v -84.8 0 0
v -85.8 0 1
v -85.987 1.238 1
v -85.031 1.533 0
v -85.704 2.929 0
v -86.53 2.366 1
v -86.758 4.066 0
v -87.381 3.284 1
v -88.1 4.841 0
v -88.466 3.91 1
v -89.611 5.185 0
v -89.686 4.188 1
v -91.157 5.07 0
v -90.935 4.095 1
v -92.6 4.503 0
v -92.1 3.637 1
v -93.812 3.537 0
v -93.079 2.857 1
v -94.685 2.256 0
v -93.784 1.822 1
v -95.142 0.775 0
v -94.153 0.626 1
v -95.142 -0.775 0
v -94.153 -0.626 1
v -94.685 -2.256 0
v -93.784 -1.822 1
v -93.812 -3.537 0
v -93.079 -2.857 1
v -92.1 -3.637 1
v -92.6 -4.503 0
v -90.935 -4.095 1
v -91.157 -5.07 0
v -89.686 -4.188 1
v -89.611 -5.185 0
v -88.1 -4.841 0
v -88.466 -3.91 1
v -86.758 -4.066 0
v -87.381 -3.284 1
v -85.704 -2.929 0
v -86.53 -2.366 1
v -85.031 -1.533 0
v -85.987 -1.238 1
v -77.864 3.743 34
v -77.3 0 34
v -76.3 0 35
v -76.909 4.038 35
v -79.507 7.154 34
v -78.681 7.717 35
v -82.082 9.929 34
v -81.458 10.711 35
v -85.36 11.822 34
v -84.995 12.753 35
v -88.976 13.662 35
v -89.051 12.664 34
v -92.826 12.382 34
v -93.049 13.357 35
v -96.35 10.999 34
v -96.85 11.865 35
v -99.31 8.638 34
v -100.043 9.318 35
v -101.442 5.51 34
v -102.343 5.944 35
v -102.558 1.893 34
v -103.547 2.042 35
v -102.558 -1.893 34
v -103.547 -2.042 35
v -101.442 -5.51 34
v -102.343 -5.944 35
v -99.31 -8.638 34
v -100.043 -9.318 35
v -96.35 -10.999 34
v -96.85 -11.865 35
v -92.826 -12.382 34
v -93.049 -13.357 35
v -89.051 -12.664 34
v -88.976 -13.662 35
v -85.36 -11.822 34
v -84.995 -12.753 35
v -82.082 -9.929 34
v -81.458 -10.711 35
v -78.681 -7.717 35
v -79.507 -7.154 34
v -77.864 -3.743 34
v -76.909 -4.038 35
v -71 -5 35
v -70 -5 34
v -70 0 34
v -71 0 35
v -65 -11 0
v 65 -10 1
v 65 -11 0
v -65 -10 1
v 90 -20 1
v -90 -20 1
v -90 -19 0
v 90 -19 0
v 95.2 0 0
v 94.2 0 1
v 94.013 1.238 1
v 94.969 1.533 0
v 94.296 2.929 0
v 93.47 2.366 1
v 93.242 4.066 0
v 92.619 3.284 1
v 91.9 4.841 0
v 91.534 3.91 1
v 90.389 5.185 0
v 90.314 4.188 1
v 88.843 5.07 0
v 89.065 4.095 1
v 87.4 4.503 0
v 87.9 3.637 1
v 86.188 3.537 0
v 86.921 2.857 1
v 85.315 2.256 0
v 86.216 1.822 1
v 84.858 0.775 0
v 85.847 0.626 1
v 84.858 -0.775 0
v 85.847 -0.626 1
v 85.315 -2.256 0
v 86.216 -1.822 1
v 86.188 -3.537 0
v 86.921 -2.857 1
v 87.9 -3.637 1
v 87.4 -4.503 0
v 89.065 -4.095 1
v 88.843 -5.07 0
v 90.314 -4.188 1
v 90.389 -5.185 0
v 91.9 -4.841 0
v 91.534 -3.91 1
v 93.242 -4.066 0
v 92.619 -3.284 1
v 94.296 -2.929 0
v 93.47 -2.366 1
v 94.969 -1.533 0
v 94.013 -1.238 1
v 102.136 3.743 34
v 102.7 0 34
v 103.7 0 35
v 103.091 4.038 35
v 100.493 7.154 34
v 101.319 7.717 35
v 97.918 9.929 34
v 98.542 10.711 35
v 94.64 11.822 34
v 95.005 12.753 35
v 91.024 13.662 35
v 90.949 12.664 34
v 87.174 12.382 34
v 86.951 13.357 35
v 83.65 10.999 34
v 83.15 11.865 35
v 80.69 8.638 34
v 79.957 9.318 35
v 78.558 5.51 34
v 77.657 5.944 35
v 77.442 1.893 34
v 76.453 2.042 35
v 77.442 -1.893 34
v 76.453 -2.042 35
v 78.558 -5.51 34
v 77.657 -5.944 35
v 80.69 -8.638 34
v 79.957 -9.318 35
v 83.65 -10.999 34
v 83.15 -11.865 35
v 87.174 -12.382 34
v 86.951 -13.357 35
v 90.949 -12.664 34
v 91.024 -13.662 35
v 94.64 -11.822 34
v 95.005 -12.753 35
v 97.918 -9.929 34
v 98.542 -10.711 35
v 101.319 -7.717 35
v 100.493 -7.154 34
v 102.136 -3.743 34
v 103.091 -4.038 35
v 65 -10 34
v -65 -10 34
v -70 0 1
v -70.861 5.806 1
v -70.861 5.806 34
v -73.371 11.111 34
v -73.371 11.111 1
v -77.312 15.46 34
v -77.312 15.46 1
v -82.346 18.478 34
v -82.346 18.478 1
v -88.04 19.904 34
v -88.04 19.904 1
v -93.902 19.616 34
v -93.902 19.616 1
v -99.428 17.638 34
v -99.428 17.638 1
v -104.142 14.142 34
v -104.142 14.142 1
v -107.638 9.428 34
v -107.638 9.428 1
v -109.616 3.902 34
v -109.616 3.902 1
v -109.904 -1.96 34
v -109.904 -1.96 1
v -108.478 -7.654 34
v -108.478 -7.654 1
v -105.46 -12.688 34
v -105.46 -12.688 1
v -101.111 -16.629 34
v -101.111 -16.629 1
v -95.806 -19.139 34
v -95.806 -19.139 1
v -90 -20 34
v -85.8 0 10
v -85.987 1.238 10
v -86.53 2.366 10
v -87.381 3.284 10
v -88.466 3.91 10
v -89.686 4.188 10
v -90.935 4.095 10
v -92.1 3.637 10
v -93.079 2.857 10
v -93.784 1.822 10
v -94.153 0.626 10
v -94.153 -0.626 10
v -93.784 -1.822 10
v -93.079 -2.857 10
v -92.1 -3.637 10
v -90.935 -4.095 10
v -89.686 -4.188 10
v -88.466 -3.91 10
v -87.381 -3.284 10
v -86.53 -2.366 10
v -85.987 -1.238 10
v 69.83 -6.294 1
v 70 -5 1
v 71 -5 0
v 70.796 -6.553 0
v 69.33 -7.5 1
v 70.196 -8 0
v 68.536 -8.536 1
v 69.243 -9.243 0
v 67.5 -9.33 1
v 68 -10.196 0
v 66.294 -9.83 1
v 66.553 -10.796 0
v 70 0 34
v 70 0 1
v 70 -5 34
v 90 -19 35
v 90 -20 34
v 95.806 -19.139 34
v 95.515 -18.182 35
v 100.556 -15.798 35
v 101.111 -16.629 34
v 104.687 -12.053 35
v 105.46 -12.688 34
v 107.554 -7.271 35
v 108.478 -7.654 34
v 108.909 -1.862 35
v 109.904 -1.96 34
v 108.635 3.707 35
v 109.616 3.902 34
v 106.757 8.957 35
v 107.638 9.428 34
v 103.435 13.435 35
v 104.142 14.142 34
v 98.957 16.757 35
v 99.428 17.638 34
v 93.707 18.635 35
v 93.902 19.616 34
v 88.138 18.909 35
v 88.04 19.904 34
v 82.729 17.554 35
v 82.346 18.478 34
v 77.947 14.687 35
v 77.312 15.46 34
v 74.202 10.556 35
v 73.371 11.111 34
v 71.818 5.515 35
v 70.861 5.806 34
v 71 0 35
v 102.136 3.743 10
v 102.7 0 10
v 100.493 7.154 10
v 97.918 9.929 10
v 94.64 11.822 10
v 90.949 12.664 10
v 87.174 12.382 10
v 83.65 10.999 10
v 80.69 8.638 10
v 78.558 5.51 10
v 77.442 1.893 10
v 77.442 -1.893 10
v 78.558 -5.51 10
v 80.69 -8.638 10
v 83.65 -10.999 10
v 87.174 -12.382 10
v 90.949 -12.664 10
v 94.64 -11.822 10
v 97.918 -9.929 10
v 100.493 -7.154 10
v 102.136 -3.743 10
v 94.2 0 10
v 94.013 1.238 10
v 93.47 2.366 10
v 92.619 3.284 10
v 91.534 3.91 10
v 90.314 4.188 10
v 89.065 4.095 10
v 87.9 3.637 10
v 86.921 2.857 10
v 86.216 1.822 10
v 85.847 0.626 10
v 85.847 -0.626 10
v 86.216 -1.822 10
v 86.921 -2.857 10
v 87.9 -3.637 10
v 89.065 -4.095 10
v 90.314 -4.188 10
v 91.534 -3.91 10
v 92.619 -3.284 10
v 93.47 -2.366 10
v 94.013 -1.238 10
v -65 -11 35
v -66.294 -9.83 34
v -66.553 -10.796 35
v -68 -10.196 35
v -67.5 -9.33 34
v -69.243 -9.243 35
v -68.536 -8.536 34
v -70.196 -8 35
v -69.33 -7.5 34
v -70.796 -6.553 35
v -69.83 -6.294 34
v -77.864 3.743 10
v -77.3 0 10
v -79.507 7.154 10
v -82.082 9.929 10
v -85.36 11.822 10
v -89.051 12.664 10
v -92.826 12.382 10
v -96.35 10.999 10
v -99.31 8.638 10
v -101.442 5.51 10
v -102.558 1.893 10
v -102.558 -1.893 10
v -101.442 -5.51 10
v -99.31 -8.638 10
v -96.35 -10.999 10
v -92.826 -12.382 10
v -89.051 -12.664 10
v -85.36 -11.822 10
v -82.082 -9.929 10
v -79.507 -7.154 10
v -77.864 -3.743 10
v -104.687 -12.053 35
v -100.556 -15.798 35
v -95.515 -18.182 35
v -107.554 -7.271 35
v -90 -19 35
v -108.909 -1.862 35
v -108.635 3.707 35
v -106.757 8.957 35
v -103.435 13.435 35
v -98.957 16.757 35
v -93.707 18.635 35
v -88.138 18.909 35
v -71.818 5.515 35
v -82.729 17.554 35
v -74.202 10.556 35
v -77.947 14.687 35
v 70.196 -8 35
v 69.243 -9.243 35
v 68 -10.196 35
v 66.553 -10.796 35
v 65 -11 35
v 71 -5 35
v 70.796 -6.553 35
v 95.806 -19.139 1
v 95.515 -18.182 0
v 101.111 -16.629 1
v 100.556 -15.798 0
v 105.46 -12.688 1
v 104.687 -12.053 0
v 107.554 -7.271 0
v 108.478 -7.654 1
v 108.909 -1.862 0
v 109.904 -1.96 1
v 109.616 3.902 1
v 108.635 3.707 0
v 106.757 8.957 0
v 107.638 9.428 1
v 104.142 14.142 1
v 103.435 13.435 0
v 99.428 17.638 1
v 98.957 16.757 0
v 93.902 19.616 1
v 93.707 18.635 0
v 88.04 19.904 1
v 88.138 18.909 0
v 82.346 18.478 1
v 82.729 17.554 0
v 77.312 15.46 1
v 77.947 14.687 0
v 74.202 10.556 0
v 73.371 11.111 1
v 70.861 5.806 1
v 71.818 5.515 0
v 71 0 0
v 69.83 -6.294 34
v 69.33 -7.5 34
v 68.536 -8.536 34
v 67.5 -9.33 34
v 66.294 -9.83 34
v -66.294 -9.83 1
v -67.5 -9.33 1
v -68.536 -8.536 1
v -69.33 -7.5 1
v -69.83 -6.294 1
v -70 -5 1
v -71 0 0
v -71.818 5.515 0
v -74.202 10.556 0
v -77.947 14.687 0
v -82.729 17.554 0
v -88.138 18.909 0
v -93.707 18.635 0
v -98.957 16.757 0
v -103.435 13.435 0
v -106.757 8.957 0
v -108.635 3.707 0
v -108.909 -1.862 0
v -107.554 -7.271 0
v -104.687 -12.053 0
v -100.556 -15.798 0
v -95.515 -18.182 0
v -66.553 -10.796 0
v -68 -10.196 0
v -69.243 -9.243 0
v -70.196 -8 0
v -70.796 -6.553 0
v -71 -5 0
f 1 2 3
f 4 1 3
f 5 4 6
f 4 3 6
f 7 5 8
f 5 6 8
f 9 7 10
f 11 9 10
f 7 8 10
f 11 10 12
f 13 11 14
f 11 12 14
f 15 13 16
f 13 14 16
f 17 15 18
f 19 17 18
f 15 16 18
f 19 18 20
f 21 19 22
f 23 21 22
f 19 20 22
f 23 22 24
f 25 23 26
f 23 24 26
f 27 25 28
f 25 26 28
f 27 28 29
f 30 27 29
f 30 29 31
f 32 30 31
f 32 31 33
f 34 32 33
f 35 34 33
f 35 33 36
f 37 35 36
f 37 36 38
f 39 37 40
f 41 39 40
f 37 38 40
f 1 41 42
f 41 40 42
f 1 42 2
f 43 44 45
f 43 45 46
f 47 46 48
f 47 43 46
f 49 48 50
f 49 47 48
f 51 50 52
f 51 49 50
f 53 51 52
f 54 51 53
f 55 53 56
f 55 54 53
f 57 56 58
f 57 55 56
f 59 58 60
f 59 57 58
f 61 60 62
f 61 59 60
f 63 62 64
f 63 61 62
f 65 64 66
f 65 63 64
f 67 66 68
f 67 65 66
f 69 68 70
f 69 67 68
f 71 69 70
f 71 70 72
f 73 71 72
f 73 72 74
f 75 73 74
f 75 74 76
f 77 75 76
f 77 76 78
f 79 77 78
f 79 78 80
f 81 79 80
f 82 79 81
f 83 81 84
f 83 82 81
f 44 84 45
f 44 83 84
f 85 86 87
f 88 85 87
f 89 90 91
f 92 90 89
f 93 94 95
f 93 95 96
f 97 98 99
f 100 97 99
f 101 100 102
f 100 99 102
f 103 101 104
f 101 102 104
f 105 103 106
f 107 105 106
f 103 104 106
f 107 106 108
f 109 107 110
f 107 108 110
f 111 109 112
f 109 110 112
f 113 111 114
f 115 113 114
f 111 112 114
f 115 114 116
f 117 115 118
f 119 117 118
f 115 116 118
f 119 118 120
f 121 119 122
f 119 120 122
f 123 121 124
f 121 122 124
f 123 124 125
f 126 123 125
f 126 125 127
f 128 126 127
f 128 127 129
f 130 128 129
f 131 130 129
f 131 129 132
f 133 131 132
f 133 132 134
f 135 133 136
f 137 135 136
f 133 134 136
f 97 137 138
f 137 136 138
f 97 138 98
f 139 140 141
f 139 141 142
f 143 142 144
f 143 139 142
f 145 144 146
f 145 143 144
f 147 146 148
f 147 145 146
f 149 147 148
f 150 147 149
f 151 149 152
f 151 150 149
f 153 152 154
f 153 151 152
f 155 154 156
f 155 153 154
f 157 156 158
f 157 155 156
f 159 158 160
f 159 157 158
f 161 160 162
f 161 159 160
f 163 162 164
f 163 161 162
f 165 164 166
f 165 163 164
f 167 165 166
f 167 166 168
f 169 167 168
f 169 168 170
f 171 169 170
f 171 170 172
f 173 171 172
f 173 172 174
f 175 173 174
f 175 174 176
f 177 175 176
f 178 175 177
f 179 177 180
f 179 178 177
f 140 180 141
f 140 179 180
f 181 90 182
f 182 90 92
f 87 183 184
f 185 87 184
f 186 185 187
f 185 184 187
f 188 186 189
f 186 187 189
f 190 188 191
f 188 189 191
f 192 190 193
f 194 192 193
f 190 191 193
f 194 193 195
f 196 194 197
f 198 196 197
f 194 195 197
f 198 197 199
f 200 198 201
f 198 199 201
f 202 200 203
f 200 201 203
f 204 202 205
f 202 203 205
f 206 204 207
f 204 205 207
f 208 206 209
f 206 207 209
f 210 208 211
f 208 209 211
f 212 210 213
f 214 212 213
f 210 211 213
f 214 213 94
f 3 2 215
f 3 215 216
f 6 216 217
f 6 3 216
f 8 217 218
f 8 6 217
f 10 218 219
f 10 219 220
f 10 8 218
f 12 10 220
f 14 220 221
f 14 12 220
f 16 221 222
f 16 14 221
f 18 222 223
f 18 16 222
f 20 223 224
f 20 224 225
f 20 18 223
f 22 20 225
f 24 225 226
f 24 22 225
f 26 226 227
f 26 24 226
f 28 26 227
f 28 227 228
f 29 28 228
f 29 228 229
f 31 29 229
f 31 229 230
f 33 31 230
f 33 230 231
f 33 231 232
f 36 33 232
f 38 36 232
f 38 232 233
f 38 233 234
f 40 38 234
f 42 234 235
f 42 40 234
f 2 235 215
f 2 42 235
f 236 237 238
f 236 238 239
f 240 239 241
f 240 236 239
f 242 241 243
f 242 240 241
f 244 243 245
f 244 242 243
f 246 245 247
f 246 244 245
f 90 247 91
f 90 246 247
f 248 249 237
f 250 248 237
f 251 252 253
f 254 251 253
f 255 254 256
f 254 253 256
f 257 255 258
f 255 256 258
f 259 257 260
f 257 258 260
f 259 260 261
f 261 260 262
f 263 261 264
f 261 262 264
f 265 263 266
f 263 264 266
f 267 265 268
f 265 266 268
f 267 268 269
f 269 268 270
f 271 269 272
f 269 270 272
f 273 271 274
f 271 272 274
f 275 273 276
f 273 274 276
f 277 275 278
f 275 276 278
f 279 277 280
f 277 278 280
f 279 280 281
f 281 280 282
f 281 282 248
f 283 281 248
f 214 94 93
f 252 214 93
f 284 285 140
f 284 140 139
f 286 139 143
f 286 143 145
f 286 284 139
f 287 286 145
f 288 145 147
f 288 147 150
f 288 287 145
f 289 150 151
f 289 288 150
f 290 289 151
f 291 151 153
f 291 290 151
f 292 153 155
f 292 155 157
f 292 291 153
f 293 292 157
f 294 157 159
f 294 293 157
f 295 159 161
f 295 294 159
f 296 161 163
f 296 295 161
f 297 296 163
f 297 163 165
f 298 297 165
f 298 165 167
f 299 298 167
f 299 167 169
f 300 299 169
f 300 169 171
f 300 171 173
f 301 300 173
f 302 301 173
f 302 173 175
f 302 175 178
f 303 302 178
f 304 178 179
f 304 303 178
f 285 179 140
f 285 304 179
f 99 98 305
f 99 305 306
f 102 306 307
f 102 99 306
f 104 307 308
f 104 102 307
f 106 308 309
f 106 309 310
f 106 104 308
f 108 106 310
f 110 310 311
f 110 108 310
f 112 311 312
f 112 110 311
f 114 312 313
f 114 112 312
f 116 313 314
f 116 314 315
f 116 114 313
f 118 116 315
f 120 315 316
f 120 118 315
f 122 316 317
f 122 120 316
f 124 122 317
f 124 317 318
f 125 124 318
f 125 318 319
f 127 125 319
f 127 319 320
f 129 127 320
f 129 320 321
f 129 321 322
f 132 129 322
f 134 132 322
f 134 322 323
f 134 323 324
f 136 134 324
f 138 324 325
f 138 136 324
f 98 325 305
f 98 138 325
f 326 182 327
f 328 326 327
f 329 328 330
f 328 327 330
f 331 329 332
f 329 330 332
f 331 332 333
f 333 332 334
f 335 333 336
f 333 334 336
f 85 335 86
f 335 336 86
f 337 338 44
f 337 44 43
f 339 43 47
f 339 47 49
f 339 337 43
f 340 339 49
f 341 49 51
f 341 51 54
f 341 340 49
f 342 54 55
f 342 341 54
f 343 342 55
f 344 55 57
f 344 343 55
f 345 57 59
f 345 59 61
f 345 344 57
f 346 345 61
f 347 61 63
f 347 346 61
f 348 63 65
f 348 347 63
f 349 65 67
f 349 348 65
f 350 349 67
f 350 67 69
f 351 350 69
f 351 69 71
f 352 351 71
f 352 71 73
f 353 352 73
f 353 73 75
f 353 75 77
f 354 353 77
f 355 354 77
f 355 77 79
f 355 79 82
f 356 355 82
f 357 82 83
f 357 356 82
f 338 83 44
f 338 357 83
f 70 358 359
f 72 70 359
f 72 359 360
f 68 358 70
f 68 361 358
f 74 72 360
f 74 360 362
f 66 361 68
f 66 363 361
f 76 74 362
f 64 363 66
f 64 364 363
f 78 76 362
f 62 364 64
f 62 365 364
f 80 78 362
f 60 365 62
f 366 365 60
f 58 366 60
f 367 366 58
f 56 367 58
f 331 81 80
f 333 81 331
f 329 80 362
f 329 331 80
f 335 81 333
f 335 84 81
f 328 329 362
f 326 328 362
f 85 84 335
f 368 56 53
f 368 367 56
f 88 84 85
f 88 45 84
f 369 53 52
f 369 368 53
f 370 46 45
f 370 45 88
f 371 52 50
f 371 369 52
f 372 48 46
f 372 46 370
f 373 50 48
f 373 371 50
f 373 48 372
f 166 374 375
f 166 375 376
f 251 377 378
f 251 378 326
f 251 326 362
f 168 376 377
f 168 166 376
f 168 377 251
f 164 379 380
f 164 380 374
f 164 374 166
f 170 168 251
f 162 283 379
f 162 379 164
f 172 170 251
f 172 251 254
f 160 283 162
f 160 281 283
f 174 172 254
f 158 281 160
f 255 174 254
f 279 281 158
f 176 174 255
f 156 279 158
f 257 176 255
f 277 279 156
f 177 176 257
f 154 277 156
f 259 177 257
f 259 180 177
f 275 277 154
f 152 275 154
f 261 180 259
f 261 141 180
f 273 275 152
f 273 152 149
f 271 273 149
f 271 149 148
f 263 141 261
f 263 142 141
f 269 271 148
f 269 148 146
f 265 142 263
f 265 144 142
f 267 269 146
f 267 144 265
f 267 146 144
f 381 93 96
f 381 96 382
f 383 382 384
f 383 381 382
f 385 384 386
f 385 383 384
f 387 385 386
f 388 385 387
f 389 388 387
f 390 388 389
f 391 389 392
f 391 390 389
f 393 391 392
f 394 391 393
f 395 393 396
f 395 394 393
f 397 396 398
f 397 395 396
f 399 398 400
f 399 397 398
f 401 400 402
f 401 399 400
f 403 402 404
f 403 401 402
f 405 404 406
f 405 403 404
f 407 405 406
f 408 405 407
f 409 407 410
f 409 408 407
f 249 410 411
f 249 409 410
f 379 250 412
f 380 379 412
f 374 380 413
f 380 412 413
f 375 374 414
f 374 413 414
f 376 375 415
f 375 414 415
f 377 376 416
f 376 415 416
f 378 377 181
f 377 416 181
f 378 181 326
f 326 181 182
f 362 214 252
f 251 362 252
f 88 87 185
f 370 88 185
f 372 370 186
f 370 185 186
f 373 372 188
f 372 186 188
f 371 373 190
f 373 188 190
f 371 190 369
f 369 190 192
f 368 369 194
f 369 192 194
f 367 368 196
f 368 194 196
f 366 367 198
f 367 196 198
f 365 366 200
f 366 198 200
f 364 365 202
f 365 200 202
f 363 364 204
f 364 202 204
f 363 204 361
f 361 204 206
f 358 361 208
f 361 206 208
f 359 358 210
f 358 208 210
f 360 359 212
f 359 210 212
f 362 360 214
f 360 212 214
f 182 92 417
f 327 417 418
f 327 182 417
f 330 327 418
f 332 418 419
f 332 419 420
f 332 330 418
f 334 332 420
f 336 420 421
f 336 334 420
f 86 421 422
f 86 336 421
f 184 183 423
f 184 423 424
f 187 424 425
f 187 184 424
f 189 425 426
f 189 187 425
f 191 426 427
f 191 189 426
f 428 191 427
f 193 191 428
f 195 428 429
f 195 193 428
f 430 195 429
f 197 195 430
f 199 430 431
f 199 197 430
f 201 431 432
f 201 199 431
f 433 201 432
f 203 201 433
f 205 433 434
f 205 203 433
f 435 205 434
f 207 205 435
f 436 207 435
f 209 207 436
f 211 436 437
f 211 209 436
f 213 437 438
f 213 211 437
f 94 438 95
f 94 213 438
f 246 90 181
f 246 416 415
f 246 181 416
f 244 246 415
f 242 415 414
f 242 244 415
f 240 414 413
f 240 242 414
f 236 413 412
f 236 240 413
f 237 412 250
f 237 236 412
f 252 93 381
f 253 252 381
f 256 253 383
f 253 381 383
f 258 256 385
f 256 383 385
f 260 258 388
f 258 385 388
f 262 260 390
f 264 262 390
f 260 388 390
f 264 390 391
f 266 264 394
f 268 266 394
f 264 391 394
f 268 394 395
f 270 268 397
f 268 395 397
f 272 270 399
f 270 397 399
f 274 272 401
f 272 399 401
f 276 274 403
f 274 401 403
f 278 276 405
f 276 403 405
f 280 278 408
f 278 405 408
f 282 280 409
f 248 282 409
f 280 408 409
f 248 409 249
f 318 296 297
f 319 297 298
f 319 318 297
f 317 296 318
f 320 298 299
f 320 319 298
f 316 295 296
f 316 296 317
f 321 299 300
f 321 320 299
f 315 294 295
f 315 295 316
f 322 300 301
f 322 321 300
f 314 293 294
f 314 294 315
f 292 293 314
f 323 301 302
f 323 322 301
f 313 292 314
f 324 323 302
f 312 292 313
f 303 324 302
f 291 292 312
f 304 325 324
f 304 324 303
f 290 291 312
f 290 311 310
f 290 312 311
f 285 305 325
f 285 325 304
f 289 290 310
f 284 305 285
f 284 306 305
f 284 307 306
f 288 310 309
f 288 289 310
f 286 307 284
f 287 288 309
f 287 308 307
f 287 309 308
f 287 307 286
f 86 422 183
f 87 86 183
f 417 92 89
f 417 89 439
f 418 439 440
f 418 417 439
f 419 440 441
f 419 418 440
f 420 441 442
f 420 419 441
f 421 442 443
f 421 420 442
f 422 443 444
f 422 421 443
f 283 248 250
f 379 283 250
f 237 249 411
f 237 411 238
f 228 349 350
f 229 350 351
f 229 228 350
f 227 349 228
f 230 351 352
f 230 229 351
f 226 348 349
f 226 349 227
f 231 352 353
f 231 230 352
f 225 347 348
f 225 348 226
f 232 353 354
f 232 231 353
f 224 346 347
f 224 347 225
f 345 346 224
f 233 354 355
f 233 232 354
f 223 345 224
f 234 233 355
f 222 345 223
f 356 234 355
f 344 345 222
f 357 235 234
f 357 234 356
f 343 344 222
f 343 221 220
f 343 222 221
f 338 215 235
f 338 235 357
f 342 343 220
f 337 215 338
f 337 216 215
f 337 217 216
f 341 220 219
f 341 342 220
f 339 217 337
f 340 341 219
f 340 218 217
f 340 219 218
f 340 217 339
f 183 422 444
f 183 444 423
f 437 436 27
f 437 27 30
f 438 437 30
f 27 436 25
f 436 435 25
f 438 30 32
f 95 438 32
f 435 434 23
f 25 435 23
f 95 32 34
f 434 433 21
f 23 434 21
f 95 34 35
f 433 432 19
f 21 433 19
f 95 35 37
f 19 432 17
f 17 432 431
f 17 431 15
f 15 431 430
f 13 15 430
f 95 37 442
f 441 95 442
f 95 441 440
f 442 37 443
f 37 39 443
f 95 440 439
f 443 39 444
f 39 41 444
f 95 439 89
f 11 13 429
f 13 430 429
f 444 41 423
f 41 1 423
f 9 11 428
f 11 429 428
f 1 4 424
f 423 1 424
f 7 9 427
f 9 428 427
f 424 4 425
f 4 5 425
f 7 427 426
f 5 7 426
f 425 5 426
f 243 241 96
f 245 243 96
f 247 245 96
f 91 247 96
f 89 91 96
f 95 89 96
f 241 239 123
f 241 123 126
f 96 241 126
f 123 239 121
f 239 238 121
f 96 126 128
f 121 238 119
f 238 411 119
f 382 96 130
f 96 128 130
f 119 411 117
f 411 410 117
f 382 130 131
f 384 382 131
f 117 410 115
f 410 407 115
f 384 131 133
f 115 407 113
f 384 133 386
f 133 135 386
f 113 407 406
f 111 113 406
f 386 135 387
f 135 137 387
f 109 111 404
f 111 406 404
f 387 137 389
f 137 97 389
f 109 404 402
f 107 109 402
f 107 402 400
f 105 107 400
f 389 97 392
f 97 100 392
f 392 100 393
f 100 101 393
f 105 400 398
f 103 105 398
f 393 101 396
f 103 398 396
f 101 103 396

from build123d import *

# Parameters (mm, degrees)
F0_R     = 4.2
F1_DEPTH = 10
F2_R     = 12.7
F3_DEPTH = 25
F4_R     = 5
F5_SIZE  = 1


with BuildPart() as f1:
    # F0 (on Top) → F1 (new body)
    with BuildSketch(Plane.XY):
        with BuildLine():
            Line((-70, -10), (-70, 0))
            ThreePointArc((-70, 0), (-104.1421356237, 14.1421356237), (-90, -20))
            Line((-90, -20), (90, -20))
            ThreePointArc((90, -20), (104.1421356237, 14.1421356237), (70, 0))
            Line((70, 0), (70, -10))
            Line((70, -10), (-70, -10))
        make_face()
        with Locations((-90, 0)):
            Circle(F0_R, mode=Mode.SUBTRACT)
        with Locations((90, 0)):
            Circle(F0_R, mode=Mode.SUBTRACT)
    extrude(amount=F1_DEPTH)

    # F2 (on face) → F3 (join)
    with BuildSketch(Plane.XY.offset(10)):
        with BuildLine():
            Line((70, -10), (-70, -10))
            Line((-70, -10), (-70, 0))
            ThreePointArc((-70, 0), (-104.1421356237, 14.1421356237), (-90, -20))
            Line((-90, -20), (90, -20))
            ThreePointArc((90, -20), (104.1421356237, 14.1421356237), (70, 0))
            Line((70, 0), (70, -10))
        make_face()
        with Locations((-90, 0)):
            Circle(F2_R, mode=Mode.SUBTRACT)
        with Locations((90, 0)):
            Circle(F2_R, mode=Mode.SUBTRACT)
    extrude(amount=F3_DEPTH)

    # F4
    f4_edges = [f1.edges().sort_by_distance(p)[0] for p in [
        (-70, -10, 17.5),
        (70, -10, 17.5),
    ]]
    fillet(f4_edges, radius=F4_R)

    # F5
    f5_edges = [f1.edges().sort_by_distance(p)[0] for p in [
        (-70, -2.5, 0),
        (-68.535534, -8.535534, 0),
        (-104.142136, 14.142136, 0),
        (0, -10, 0),
        (0, -20, 0),
        (68.535534, -8.535534, 0),
        (104.142136, 14.142136, 0),
        (70, -2.5, 0),
        (-94.2, 0, 0),
        (85.8, 0, 0),
        (70, -2.5, 35),
        (68.535534, -8.535534, 35),
        (104.142136, 14.142136, 35),
        (0, -10, 35),
        (0, -20, 35),
        (-68.535534, -8.535534, 35),
        (-104.142136, 14.142136, 35),
        (-70, -2.5, 35),
        (-102.7, 0, 35),
        (77.3, 0, 35),
    ]]
    chamfer(f5_edges, length=F5_SIZE)


solid = f1.part
